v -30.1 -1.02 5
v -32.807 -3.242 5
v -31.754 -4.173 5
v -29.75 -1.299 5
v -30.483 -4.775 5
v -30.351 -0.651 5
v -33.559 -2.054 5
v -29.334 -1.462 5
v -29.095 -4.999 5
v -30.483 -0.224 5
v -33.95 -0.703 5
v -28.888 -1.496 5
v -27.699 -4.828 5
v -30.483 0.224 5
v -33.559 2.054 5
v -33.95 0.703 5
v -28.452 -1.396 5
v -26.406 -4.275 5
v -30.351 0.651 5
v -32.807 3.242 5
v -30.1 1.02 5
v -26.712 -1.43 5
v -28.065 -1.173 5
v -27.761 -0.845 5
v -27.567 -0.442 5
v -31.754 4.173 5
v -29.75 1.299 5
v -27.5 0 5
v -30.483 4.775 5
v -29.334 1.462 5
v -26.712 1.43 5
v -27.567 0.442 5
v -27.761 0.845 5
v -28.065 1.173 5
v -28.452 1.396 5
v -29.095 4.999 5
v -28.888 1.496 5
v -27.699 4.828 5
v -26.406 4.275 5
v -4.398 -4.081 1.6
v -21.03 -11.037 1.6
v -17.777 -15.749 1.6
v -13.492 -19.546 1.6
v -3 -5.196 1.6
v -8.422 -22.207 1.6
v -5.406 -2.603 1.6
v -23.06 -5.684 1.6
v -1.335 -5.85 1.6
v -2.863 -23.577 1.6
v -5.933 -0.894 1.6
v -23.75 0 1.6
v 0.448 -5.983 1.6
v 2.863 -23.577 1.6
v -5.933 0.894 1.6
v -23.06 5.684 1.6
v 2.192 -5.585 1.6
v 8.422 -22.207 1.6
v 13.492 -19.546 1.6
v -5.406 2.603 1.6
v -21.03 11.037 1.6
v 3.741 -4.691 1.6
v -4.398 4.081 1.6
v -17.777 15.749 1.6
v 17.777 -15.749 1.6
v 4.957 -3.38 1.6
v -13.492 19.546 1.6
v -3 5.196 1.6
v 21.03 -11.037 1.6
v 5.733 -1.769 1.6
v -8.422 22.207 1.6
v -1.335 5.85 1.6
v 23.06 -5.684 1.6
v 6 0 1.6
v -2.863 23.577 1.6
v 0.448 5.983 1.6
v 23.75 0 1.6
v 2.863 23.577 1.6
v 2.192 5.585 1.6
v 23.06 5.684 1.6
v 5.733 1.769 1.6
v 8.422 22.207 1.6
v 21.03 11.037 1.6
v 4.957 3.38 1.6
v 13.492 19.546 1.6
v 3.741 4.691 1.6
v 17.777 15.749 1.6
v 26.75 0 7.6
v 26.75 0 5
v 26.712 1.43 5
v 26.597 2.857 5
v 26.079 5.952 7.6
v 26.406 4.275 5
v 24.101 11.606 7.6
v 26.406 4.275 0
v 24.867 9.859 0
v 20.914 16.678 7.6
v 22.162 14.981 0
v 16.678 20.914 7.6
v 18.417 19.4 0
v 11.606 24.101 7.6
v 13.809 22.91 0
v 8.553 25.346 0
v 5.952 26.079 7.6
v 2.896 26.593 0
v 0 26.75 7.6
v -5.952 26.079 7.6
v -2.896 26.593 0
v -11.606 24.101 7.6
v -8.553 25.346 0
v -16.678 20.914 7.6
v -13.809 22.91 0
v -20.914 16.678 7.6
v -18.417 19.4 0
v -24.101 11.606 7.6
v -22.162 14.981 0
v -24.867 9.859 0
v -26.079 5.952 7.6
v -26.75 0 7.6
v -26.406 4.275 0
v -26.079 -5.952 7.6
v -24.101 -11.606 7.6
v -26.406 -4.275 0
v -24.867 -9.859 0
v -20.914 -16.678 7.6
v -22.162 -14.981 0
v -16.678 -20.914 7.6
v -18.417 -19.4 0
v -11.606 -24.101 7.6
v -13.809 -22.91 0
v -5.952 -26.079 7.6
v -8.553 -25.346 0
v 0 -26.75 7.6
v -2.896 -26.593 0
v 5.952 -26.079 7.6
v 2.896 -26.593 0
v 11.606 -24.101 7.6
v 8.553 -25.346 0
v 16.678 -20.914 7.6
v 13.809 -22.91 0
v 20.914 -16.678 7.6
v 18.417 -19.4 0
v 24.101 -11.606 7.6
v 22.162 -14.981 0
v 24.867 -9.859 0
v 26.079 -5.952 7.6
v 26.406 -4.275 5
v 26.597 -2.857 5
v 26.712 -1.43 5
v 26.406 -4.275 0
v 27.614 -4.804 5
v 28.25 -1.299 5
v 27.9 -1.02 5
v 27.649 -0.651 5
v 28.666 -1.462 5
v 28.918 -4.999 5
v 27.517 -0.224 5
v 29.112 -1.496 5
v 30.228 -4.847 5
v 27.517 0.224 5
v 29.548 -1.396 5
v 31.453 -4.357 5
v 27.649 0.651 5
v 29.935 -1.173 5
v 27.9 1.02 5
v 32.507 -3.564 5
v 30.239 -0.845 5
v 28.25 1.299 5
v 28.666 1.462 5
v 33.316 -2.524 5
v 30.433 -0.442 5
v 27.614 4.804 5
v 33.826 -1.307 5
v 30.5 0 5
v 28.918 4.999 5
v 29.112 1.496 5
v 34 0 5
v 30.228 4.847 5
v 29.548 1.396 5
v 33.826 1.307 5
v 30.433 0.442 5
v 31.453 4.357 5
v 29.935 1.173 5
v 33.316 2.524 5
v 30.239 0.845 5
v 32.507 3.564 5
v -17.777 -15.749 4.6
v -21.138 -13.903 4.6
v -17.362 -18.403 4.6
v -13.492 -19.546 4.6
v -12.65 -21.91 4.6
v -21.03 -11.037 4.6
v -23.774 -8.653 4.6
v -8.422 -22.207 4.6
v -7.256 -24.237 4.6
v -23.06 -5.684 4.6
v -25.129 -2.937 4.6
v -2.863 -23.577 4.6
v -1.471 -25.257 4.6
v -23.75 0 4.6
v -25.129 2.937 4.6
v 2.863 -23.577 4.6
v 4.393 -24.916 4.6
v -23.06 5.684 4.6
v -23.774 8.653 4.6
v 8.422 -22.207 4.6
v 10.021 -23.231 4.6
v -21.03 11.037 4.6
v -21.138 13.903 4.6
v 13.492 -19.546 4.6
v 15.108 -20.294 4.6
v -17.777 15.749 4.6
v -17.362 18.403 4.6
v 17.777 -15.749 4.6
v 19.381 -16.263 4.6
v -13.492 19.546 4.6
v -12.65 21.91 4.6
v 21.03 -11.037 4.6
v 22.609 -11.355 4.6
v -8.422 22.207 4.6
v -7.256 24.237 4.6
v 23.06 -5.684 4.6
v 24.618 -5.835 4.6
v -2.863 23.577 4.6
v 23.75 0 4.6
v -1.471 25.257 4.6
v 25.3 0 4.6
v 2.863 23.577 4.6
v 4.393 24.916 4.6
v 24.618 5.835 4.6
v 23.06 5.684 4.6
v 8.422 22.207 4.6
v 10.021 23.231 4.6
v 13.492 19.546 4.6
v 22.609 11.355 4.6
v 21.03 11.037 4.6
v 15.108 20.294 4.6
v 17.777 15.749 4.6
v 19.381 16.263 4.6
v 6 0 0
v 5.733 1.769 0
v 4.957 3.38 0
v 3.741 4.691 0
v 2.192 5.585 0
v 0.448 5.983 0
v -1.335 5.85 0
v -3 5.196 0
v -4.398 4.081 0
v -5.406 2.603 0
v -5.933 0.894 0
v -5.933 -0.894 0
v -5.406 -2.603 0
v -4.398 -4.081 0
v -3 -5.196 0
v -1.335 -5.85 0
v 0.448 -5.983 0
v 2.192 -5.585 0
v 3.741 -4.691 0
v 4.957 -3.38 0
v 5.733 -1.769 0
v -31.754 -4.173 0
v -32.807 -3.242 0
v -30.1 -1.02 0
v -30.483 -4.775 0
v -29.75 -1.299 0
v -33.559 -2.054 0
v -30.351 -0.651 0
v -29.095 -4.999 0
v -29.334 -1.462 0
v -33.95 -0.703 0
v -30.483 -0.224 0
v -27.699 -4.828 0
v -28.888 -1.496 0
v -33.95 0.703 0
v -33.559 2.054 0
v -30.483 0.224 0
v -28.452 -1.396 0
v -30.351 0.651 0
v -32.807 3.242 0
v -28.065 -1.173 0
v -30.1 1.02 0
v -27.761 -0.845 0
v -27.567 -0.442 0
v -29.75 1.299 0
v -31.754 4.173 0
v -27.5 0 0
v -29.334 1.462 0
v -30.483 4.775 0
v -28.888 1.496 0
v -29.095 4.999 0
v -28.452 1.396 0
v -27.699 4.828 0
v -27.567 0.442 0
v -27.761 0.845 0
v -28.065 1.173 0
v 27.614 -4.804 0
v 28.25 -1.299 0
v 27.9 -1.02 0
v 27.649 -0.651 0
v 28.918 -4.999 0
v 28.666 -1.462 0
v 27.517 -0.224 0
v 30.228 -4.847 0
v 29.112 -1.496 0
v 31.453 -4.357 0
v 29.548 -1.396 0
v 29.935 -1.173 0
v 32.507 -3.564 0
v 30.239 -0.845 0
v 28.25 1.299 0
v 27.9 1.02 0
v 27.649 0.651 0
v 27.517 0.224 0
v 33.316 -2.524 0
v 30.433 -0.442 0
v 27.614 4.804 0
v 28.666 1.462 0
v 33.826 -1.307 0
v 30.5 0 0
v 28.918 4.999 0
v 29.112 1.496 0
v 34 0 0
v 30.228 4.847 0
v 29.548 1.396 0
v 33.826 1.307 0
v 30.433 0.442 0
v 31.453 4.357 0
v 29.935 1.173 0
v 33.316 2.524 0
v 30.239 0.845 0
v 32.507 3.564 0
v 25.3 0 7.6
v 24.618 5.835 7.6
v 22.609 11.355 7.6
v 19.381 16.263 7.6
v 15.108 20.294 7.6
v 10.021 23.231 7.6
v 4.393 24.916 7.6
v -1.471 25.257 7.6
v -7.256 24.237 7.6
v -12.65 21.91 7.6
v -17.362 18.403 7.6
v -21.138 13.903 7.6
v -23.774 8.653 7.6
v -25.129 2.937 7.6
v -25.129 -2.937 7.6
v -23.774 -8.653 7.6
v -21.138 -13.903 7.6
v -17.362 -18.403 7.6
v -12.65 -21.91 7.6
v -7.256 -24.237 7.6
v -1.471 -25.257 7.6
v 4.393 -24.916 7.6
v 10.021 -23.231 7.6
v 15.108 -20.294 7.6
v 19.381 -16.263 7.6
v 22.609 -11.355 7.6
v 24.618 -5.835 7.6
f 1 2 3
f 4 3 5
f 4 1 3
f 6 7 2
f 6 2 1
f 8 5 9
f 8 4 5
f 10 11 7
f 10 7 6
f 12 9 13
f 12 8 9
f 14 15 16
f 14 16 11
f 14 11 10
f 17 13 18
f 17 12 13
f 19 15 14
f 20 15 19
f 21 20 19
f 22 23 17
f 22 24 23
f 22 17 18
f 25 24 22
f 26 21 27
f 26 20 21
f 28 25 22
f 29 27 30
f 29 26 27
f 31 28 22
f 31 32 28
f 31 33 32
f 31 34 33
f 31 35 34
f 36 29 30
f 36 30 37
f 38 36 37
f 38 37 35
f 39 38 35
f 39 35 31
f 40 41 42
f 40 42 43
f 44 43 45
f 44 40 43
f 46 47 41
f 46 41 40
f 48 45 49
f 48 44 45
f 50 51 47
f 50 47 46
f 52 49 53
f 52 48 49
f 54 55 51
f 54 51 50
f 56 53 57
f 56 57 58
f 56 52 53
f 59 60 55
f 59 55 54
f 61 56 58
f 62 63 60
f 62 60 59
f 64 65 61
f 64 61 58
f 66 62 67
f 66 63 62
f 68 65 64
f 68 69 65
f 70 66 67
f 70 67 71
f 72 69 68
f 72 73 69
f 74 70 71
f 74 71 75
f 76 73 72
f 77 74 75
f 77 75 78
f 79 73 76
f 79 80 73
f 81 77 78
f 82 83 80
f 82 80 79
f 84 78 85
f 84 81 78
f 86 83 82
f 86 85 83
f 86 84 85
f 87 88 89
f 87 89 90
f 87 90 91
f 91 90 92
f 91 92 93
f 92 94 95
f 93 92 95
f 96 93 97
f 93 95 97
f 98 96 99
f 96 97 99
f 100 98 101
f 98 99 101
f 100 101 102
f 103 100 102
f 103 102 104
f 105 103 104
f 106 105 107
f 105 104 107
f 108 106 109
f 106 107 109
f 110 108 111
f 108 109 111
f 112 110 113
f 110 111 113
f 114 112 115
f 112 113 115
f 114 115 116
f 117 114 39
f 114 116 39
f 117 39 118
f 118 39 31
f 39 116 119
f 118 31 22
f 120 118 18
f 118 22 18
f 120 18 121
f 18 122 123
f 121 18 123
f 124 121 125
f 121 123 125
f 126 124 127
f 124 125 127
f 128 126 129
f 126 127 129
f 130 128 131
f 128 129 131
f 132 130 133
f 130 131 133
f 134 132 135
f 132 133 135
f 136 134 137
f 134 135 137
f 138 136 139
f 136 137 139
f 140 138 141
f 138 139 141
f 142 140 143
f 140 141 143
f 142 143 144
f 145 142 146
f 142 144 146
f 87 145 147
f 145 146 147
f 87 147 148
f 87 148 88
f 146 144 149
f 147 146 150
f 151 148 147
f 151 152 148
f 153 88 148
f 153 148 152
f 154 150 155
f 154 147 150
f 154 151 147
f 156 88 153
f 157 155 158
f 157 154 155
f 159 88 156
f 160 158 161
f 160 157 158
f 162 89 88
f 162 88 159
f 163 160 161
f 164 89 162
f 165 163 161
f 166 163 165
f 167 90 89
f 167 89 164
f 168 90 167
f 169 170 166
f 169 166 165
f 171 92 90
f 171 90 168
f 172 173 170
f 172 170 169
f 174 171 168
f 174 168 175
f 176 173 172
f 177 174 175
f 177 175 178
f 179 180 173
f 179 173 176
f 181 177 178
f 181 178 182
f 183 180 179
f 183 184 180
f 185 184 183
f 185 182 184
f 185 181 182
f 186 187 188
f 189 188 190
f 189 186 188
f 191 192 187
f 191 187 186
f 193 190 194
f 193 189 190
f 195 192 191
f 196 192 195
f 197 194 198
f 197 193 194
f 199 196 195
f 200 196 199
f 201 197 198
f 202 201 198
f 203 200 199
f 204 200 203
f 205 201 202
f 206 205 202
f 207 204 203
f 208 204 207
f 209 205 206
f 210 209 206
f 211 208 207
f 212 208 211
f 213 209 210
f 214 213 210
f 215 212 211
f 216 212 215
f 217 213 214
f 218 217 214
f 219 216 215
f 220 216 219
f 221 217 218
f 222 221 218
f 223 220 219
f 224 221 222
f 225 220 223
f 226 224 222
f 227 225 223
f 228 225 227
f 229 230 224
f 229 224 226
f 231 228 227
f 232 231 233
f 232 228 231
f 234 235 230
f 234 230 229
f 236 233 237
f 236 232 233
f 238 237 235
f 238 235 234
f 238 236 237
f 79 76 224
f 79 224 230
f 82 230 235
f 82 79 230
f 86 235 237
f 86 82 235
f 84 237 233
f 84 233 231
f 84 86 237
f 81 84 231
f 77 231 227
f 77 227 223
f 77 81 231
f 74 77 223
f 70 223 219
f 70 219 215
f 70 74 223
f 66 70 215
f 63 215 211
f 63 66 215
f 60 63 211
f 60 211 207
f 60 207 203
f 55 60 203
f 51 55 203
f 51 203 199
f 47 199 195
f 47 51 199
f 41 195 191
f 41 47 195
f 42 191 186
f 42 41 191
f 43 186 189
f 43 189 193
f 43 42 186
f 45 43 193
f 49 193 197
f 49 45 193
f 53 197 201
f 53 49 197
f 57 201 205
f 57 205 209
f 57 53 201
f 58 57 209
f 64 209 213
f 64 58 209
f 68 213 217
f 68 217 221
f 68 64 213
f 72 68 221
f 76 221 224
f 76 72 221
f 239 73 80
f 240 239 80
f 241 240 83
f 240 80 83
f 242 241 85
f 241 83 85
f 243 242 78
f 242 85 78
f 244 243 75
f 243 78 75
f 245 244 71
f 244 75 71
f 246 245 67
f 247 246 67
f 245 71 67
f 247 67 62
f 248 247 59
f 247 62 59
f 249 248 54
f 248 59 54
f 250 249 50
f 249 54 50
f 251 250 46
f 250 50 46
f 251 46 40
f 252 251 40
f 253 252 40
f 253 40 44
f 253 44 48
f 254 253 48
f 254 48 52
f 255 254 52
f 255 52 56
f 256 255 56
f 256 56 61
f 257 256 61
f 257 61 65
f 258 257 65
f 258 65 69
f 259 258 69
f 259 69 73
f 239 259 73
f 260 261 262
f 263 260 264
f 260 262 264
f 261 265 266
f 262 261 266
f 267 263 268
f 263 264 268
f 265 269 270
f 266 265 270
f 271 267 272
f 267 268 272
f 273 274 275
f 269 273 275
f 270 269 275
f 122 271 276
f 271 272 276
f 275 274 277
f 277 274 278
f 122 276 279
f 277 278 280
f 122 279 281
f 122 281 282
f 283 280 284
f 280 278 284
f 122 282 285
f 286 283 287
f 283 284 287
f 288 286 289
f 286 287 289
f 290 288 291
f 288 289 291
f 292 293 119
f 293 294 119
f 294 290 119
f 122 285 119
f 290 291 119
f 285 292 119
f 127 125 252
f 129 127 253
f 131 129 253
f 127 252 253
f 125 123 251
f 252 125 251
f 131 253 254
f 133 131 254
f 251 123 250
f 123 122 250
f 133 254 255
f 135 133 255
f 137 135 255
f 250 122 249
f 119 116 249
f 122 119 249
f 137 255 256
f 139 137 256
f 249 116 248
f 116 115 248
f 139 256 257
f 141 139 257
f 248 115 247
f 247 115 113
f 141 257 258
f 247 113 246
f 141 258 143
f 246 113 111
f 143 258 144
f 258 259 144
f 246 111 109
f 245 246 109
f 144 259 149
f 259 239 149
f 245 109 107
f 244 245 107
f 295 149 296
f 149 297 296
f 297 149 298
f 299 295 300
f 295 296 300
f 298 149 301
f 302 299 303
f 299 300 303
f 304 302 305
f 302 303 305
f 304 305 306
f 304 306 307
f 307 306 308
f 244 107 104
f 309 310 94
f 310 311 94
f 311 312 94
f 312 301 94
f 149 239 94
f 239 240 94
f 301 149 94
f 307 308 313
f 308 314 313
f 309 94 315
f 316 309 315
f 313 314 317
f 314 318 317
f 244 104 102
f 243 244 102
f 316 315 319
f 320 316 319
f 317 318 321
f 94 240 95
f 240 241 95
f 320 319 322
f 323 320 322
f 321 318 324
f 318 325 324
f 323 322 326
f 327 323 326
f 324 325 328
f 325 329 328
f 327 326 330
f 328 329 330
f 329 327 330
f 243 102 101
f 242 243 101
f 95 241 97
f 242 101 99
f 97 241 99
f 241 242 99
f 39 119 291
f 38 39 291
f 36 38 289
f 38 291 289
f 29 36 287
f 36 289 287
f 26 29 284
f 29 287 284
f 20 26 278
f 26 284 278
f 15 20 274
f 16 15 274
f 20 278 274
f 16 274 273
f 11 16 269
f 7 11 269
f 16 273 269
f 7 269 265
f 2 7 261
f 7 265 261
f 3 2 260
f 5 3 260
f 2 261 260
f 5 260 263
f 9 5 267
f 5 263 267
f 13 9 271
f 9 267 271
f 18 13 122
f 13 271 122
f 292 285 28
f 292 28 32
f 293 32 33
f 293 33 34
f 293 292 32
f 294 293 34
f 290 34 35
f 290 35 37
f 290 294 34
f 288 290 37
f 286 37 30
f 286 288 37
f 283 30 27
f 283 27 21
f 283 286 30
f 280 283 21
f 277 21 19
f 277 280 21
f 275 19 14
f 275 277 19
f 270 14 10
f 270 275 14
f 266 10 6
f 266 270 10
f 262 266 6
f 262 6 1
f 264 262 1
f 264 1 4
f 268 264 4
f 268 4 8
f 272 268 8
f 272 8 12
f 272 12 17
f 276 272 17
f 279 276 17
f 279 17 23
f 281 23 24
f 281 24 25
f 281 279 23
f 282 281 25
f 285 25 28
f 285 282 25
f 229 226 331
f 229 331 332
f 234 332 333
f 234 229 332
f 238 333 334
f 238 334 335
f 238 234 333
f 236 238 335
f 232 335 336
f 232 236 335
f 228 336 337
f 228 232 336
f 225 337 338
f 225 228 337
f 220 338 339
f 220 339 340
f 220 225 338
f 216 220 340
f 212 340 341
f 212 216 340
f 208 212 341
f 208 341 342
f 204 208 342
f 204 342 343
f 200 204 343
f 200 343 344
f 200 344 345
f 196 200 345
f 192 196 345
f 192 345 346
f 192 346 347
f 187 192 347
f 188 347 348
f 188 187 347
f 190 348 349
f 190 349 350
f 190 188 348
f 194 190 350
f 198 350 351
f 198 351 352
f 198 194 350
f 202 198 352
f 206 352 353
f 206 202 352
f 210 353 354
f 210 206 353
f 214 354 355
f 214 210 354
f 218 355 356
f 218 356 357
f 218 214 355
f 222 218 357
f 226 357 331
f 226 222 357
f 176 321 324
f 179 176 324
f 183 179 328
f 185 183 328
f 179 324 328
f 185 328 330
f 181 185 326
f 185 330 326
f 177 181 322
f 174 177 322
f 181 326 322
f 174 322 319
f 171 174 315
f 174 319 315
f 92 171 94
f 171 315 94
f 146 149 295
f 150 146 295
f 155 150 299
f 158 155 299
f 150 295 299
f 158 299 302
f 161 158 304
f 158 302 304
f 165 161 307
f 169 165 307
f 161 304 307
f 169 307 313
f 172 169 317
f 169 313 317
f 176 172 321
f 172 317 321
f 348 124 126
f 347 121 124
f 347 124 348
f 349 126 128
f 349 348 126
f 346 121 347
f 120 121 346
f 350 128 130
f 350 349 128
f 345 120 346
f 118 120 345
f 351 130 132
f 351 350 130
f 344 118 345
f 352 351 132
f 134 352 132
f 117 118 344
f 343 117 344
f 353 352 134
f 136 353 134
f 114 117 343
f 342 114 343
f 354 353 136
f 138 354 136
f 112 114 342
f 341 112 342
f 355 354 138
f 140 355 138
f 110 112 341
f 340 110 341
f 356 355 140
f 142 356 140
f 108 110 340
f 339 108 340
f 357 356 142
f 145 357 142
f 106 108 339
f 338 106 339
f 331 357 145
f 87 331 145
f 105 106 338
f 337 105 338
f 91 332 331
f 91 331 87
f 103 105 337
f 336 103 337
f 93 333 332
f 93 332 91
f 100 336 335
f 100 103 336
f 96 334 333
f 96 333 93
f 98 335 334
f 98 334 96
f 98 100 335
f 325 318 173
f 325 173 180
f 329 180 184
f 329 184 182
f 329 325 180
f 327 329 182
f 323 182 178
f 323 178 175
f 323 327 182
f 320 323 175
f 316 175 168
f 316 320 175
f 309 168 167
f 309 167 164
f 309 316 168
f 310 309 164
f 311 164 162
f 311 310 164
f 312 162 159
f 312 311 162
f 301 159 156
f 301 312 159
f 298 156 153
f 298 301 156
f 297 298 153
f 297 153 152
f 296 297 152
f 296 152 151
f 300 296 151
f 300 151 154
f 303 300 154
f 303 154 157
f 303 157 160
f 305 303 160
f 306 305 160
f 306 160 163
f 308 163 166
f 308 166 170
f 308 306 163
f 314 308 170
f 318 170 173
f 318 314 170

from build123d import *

# Parameters (mm, degrees)
F0_R     = 26.75
F1_DEPTH = 1.6
F2_R     = 26.75
F2_R_2   = 23.75
F3_DEPTH = 3
F4_R     = 26.75
F4_R_2   = 25.3
F5_DEPTH = 3
F6_R     = 6
F7_DEPTH = 25
F8_R     = 1.5
F9_DEPTH = 5


with BuildPart() as f1:
    # F0 (on Top) → F1 (new body)
    with BuildSketch(Plane.XY):
        Circle(F0_R)
    extrude(amount=F1_DEPTH)

    # F2 (on face) → F3 (join)
    with BuildSketch(Plane.XY.offset(1.6)):
        Circle(F2_R)
        Circle(F2_R_2, mode=Mode.SUBTRACT)
    extrude(amount=F3_DEPTH)

    # F4 (on face) → F5 (join)
    with BuildSketch(Plane.XY.offset(4.6)):
        Circle(F4_R)
        Circle(F4_R_2, mode=Mode.SUBTRACT)
    extrude(amount=F5_DEPTH)

    # F6 (on face) → F7 (cut)
    with BuildSketch(Plane.XY.offset(1.6)):
        Circle(F6_R)
    extrude(amount=-F7_DEPTH, mode=Mode.SUBTRACT)

    # F8 (on Top) → F9 (join)
    with BuildSketch(Plane.XY):
        with BuildLine():
            ThreePointArc((-26.40625, -4.2746299182), (-26.75, 0), (-26.40625, 4.2746299182))
            ThreePointArc((-26.40625, 4.2746299182), (-34, 0), (-26.40625, -4.2746299182))
        make_face()
        with Locations((-29, 0)):
            Circle(F8_R, mode=Mode.SUBTRACT)
        with BuildLine():
            ThreePointArc((26.40625, -4.2746299182), (31.4526771088, -4.3571062645), (34, 0))
            ThreePointArc((34, 0), (31.4526771088, 4.3571062645), (26.40625, 4.2746299182))
            ThreePointArc((26.40625, 4.2746299182), (26.6639240126, 2.1442145998), (26.75, 0))
            ThreePointArc((26.75, 0), (26.6639240126, -2.1442145998), (26.40625, -4.2746299182))
        make_face()
        with Locations((29, 0)):
            Circle(F8_R, mode=Mode.SUBTRACT)
    extrude(amount=F9_DEPTH)


solid = f1.part
